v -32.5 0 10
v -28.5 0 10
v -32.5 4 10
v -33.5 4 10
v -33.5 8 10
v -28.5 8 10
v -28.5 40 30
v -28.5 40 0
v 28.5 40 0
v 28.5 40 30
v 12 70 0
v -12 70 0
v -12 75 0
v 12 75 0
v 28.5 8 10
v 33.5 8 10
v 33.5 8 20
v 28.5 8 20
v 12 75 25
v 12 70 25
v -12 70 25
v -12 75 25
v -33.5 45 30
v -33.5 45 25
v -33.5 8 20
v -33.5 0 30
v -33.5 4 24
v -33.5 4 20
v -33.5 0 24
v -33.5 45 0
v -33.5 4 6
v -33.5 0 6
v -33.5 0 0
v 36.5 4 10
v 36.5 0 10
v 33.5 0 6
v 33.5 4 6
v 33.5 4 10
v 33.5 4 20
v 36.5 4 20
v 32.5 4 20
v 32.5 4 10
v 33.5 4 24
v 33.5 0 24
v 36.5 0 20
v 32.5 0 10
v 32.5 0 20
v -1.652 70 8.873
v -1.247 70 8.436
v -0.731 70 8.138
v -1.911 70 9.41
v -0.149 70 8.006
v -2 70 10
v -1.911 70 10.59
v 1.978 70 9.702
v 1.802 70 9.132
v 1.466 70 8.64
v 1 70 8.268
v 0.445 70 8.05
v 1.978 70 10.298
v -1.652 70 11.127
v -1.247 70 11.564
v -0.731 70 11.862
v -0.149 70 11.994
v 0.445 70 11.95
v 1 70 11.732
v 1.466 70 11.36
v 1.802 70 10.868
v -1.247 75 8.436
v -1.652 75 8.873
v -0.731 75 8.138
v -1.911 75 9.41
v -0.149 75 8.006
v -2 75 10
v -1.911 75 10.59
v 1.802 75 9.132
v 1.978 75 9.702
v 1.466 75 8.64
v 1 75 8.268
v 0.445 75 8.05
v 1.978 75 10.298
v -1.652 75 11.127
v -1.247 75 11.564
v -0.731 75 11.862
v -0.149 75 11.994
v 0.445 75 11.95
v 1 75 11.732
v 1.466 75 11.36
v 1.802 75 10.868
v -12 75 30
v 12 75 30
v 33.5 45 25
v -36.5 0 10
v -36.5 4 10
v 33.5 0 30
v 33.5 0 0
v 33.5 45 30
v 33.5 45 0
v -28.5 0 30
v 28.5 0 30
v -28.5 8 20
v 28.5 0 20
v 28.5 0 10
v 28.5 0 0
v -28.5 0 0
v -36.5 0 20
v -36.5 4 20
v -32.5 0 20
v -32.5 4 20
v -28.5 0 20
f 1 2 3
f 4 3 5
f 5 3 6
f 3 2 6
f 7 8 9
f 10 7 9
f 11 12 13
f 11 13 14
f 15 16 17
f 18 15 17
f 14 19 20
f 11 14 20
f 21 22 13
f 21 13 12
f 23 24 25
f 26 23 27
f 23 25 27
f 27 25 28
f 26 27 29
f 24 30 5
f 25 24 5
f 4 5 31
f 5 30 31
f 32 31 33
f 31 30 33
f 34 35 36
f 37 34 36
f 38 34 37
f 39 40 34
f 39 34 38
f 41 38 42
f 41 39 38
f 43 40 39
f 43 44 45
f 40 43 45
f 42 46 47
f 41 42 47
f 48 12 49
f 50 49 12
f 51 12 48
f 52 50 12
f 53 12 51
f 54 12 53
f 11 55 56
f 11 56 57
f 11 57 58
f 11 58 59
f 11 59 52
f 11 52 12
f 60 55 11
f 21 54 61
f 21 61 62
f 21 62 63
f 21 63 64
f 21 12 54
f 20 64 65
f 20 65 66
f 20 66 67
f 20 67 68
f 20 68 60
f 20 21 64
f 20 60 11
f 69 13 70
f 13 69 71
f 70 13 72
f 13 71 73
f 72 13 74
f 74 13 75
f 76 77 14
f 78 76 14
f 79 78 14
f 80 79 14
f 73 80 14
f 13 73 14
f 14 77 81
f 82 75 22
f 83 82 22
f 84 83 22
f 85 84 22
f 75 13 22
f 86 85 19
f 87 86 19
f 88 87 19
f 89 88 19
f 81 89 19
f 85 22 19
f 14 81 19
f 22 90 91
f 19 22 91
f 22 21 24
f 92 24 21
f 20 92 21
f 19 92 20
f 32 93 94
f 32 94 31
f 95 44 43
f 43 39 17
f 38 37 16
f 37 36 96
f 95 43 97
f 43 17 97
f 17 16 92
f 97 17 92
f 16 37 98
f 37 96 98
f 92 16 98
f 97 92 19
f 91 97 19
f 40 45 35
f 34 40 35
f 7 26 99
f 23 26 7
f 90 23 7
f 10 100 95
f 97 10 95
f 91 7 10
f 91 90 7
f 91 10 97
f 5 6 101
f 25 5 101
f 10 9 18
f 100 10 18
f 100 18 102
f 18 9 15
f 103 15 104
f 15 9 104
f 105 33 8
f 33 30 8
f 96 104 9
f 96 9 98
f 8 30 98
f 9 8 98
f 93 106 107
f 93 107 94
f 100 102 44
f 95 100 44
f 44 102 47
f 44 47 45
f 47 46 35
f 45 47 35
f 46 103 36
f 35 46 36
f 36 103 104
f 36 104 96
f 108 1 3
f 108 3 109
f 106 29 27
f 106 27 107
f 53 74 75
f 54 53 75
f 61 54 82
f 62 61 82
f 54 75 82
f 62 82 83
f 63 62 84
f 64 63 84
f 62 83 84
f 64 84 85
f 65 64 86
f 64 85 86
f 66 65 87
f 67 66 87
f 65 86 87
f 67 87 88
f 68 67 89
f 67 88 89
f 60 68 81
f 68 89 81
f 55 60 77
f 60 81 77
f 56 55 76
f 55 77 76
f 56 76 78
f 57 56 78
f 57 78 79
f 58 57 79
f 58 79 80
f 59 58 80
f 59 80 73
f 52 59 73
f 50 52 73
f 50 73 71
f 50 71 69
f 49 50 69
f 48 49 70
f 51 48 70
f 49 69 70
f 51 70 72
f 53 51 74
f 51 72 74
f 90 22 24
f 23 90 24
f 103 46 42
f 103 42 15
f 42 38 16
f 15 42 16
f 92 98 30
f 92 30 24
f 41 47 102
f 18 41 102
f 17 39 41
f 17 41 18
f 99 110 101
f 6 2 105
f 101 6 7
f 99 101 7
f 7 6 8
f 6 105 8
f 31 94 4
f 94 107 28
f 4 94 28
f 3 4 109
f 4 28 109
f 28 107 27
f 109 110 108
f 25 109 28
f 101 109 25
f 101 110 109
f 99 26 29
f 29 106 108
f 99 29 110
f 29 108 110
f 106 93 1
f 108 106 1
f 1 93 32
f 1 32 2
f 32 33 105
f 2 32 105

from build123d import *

# Parameters (mm, degrees)
PAD_DEPTH       = 30
SKETCH001_W     = 30
SKETCH001_H     = 25
SKETCH001_W_2   = 8
SKETCH001_H_2   = 10
POCKET_DEPTH    = 67.001
SKETCH002_W     = 24
SKETCH002_H     = 5
PAD001_DEPTH    = 25
SKETCH003_R     = 2
POCKET001_DEPTH = 5
PAD002_DEPTH    = 4


with BuildPart() as part:
    # Sketch → Pad (new body)
    with BuildSketch(Plane.XY):
        Polygon((-28.5, 0), (-28.5, 40), (28.5, 40), (28.5, 0), (33.5, 0), (33.5, 45), (12, 75), (-12, 75), (-33.5, 45), (-33.5, 0), align=None)
    extrude(amount=PAD_DEPTH)

    # Sketch001 (on Face7 of Pad) → Pocket (cut, through all)
    with BuildSketch(Plane.YZ.offset(33.5)):
        with Locations((60, 12.5)):
            Rectangle(SKETCH001_W, SKETCH001_H)
        with Locations((4, 15)):
            Rectangle(SKETCH001_W_2, SKETCH001_H_2)
    extrude(amount=-POCKET_DEPTH, mode=Mode.SUBTRACT)

    # Sketch002 (on Face19 of Pocket) → Pad001 (join)
    with BuildSketch(Plane(origin=(0, 0, 25), x_dir=(1, 0, 0), z_dir=(0, 0, -1))):
        with Locations((0, -72.5)):
            Rectangle(SKETCH002_W, SKETCH002_H)
    extrude(amount=PAD001_DEPTH)

    # Sketch003 (on Face23 of Pad001) → Pocket001 (cut)
    with BuildSketch(Plane(origin=(0, 75, 0), x_dir=(-1, 0, 0), z_dir=(0, 1, 0))):
        with Locations((0, 10)):
            Circle(SKETCH003_R)
    extrude(amount=-POCKET001_DEPTH, mode=Mode.SUBTRACT)

    # Sketch004 (on Face12 of Pocket001) → Pad002 (join)
    with BuildSketch(Plane.XZ):
        Polygon((32.5, 20), (33.5, 24), (36.5, 20), (36.5, 10), (33.5, 6), (32.5, 10), align=None)
        Polygon((-32.5, 20), (-33.5, 24), (-36.5, 20), (-36.5, 10), (-33.5, 6), (-32.5, 10), align=None)
    extrude(amount=-PAD002_DEPTH)


solid = part.part
